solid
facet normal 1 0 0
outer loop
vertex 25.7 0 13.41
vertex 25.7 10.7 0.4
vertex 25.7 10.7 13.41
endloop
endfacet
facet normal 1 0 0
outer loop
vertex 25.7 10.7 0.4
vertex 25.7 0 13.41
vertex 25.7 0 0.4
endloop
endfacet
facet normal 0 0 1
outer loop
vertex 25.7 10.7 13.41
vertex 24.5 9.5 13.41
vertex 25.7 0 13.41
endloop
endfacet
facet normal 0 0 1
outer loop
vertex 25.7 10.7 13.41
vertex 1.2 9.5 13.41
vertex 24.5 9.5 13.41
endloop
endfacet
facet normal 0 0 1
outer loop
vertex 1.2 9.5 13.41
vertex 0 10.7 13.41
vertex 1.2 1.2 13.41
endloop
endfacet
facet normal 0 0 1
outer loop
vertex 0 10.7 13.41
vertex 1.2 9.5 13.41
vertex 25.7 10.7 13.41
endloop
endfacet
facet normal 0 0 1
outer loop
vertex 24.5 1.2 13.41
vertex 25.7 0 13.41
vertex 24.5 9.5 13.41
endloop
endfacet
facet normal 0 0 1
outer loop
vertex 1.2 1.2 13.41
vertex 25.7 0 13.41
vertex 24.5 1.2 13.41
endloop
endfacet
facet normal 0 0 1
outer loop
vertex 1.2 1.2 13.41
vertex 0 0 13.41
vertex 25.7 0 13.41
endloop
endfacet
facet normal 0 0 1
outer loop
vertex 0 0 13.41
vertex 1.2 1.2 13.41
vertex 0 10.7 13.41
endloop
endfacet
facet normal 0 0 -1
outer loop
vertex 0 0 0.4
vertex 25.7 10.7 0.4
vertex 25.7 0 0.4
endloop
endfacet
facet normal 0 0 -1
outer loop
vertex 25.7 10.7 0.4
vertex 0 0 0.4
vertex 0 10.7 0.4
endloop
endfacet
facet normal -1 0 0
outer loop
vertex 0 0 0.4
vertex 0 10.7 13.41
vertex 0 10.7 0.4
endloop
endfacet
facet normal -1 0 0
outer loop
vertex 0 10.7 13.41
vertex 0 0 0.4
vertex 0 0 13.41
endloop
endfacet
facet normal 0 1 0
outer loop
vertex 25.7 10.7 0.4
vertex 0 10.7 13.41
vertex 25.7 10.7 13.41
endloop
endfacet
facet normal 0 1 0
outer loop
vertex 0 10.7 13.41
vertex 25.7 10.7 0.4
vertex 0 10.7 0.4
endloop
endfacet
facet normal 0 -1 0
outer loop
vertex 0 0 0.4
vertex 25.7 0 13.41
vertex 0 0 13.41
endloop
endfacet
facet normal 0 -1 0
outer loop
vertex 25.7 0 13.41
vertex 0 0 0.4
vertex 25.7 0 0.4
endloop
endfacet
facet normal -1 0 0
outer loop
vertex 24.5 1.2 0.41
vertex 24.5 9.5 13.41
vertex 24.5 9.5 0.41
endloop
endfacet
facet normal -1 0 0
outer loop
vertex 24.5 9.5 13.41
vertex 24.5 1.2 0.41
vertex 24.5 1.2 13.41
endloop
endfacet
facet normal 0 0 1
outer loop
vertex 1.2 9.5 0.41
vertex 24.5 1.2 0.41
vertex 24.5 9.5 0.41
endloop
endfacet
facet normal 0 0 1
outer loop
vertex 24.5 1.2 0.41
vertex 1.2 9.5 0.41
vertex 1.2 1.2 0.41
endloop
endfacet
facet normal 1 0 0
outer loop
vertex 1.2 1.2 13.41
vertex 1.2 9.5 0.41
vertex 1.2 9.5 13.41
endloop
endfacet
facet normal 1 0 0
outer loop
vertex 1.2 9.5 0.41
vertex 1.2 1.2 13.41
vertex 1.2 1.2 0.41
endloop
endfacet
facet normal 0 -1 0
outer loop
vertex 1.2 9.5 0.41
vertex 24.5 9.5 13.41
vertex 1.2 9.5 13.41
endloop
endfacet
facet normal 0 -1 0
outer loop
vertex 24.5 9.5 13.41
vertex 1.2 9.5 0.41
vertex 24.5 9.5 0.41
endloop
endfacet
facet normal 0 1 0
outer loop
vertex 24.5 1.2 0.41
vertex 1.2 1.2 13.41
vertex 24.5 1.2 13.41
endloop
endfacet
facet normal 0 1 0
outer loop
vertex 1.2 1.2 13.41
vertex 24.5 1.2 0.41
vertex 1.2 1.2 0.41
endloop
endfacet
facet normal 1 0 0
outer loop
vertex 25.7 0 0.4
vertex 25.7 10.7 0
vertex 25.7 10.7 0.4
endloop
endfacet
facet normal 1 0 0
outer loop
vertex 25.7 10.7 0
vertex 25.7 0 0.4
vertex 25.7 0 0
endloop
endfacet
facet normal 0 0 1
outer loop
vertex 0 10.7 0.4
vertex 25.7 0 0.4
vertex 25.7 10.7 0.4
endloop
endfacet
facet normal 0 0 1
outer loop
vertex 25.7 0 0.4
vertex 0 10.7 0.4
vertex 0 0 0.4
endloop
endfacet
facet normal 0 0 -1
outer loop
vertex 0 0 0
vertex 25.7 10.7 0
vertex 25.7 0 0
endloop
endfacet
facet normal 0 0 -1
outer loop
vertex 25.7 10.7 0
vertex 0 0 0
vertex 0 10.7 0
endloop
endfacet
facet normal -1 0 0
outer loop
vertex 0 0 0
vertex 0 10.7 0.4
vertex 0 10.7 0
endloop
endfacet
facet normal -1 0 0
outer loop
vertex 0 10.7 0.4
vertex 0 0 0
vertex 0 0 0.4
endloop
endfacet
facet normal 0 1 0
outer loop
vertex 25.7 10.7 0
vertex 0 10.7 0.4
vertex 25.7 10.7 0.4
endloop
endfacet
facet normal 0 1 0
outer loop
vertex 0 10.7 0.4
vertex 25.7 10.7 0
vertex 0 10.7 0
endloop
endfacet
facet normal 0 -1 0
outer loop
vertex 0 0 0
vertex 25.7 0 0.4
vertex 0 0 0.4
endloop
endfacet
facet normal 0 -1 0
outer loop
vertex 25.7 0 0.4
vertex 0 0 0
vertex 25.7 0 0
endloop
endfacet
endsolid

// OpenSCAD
// file: ../../Base/Boxes.scad
// Fischertechnik Box Foundation
// Pre-designed Boxes

use <Constants.scad>

include <PlacementOptions.scad>

box190Width = 190;
box190Depth = 130;
box130Width = 130;
box130Depth = 95;
boxUsageHeight = 33.9;
boxWallThickness = 2.4;
boxBaseThickness = 1.0;
boxWebWidth = 3.0;

// getBoxWallThickness()
// Gets the wall thickness of a Fischertechnik Box

function getBoxWallThickness() = boxWallThickness;

// Gets the usable height of a fischertechnik box
function getBoxUsageHeight() = boxUsageHeight;

// Gets the thickness of the Fischertechnik box base.
function getBoxBaseThickness() = boxBaseThickness;

// Gets the width of a box web
function getBoxWebWidth() = boxWebWidth;

// Gets the usable inner space of a Box 190 as an x/y-list
function getBox190Space() = [
    box190Width - 2*getBoxWallThickness(), 
    box190Depth - 2*getBoxWallThickness() ];

// Imports the Fischertechnik empty box 130x190 mm and places it at position 0,0
// 190x130 are the outer sizes, the inner space is slightly smaller. Use getBox190Space() to get the inner sizes.
// This module needs the STL file "Fischertechnik Box 130x190.stl" in the library path.
// The box is positioned that the usable inner space is at the 0,0,0 position. The

module Box190() {
    translate([-getBoxWallThickness(),-getBoxWallThickness(),-getBoxBaseThickness()])
        import("Fischertechnik Box 130x190.stl", convexity=3);
}

// Gets the usable inner space of a Box 130 as an x/y-list
function getBox130Space() = [
    box130Width - 2*getBoxWallThickness(), 
    box130Depth - 2*getBoxWallThickness() ];

// Imports the Fischertechnik empty box 95x130 mm and places it at position 0,0
// 190x130 are the outer sizes, the inner space is slightly smaller. Use getBox190Space() to get the inner sizes.
// This module needs the STL file "Fischertechnik Box 95x130.stl" in the library path.
// The box is positioned that the usable inner space is at the 0,0,0 position. The

module Box130() {
    translate([-getBoxWallThickness(),-getBoxWallThickness(),-getBoxBaseThickness()])
        import("Fischertechnik Box 95x130.stl", convexity=3);
}

// Creates a web at the specified box walls
// corner 0 = LowerLeft, 1 = UpperLeft, 2 = UpperRight, 3 = LowerRight
// side 0 = LeftOfCorner, 1 = RightOfCorner
// distance = Distance in mm from the corner
// box = inner width and depth of the box (default: Box 190)
// webWidth = length of the web (default is 3 mms)
// webThickness = thickness of the web (default is 1 mm)

module BoxWeb(corner, side, distance, box=getBox190Space(), webWidth=getBoxWebWidth(), webThickness=1.0) {
    sink = getBoxWallThickness()/2;

    width = (corner % 2 == 0) ? 
            (side == LeftOfCorner ? webWidth : webThickness) :
            (side == LeftOfCorner ? webThickness : webWidth);

    depth = (corner % 2 == 0) ? 
            (side == RightOfCorner ? webWidth : webThickness) :
            (side == RightOfCorner ? webThickness : webWidth);
    
    xDiff = corner == LowerLeft ? 
                (side == LeftOfCorner ? -sink : distance) :
            (corner == UpperLeft ?                
                (side == LeftOfCorner ? distance : -sink) :
            (corner == UpperRight ?
                (side == LeftOfCorner ? box.x-webWidth+sink : box.x-distance-webThickness) :
                (side == LeftOfCorner ? box.x-distance-webThickness: box.x-webWidth+sink)));

    yDiff = corner == LowerLeft ? 
                (side == RightOfCorner ? -sink : distance) :
            (corner == UpperLeft ?
                (side == RightOfCorner ? box.y-distance : box.y-webWidth+sink) :
            (corner == UpperRight ?
                (side == RightOfCorner ? box.y-webWidth+sink : box.y-distance) :
                (side == RightOfCorner ? distance : -sink)));
    
    translate([xDiff, yDiff, -getExcess()])
        cube([width, depth, boxUsageHeight + 2*getExcess()]);
}
// file: ../../Base/Rotation.scad
// Fischertechnik Box Foundation
// Geometry Helpers Rotation

include <PlacementOptions.scad>

// getRotatedSpace(space, rotation=NoRotation)
// Rotates the space dependent on the specified rotation

function getRotatedSpace(space, rotation=NoRotation) = [
    (rotation == Rotate90 || rotation == Rotate270) ? space.y : space.x,
    (rotation == Rotate90 || rotation == Rotate270) ? space.x : space.y
];

// Rotates the given space around the fixed left lower corner
// space = the space the children needs as width/depth list [width,depth]
// rotation = 0 Rotate0 degrees, 1 Rotate90 degrees, 2 Rotate180 degrees, 3 Rotate270 degrees (equivalent to -90)

module RotateFix(space, rotation=Rotate0) {
    dy = (rotation == Rotate0 || rotation == Rotate270) ? 0 :
        (rotation == Rotate90) ? space.x :
        space.y;
    dx = (rotation < Rotate180) ? 0 :
        (rotation == Rotate180) ? space.x :
        space.y;
    
    translate([dx, dy, 0])
        rotate([0, 0, rotations[rotation]])
            children();
}
// file: ../../Base/Alignment.scad
// Fischertechnik Box Foundation
// Geometry Helpers Alignment

include <PlacementOptions.scad>

// getAlignedX(elementWidth, spaceWidth, align=AlignRight, offset=0)
// Gets the aligned X offset of an element with the given
// width in the given space.
// elementWidth = The width of the element to positon
// spaceWidth = The space where the element should be aligned
// align = 0 AlignLeft, 1 AlignCenter, 2 AlignRight
// offset = an optional offset from the aligned position. When
// aligned left or centered, then positive values are in X direction.
// When aligned right then positive values are in negative X direction.

function getAlignedX(elementWidth, spaceWidth, align=AlignRight, offset=0) =
    (align == AlignLeft) ?
        offset :
        ((align == AlignCenter) ?
        (spaceWidth - elementWidth)/2 + offset :
        spaceWidth - offset - elementWidth);

// getAlignedY(elementDepth, spaceDepth, align=AlignTop, offset=0)
// Gets the aligned Y offset of an element with the given
// depth in the given space.
// elementDepth = The depth of the element to positon
// spaceDepth = The space where the element should be aligned
// align = 0 AlignBottom, 1 AlignCenter, 2 AlignTop
// offset = an optional offset from the aligned position. When
// aligned bottom or centered, then positive values are in Y direction.
// When aligned top then positive values are in negative Y direction.

function getAlignedY(elementDepth, spaceDepth, align=AlignTop, offset=0) =
    (align == AlignBottom) ?
        offset :
        ((align == AlignCenter) ?
        (spaceDepth - elementDepth)/2 + offset :
        spaceDepth - offset - elementDepth);
// file: ../../Base/PlacementOptions.scad
// Fischertechnik Box Foundation
// Placement Options

// Alignment
NoAlign = 0;
AlignLeft = 1;
AlignBottom = 2;
AlignCenter = 3;
AlignRight = 4;
AlignTop = 5;

// Element rotation degree steps
rotations = [0, -90, -180, -270];

// Rotation
NoRotation = 0;
Rotate0 = 0;
Rotate90 = 1;
Rotate180 = 2;
Rotate270 = 3;

// Docking (seen from above)
NoDock = -1;
DockLeft = 0;
DockTop = 1;
DockRight = 2;
DockCorner = 2;
DockBottom = 3;

// Web corners
LowerLeft = 0;
UpperLeft = 1;
UpperRight = 2;
LowerRight = 3;

// Web position relative to corner
LeftOfCorner = 0;
RightOfCorner = 1;
// file: ../../Base/Placement.scad
// Fischertechnik Box Foundation
// Geometry Helpers Placement

use <Constants.scad>
use <Alignment.scad>
use <Rotation.scad>
use <Boxes.scad>

include <PlacementOptions.scad>

// Place(x=0, y=0, elementSpace=[0,0], alignX=AlignLeft, alignY=AlignBottom, rotation=Rotate0, boxSpace=getBox190Space())
// Places the child at the specified position
// y = Y-Position. This is a relative position when an X aligment is specified.
// x = X-Position. This is a relative position when an Y aligment is specified.
// elementSpace = space of the element to be placed [x,y]
// alignX = -1=NoAlign, 0 AlignLeft, 1 AlignCenter, 3 AlignRight (elementSpace and boxSpace required!)
// alignY = -1=NoAlign, 2 AlignBottom, 1 AlignCenter, 4 AlignTop (elementSpace and boxSpace required!)
// rotation = 0 Rotate0 0 degrees, 1 Rotate90 90 degrees, 
// 2 Rotate180 180 degrees, 3 Rotate270 270 degrees (equivalent to -90)
// boxSpace = Inner space of the box where the placement occurs [x,y] - default is Box 190x130 inner space

module Place(x=0, y=0, elementSpace=[0,0], 
  alignX=AlignLeft, alignY=AlignBottom, 
  rotation=NoRotation, boxSpace=getBox190Space()) {

    module Position(x, y, space, rotation=Rotate0) {
        translate([x, y, 0])
            RotateFix(space, rotation)
                children();
    }

    space = getRotatedSpace(elementSpace, rotation);
    alignedX = getAlignedX(space.x, boxSpace.x, alignX, x);
    alignedY = getAlignedY(space.y, boxSpace.y, alignY, y);
    Position(alignedX, alignedY, elementSpace, rotation)
        children();
}

// Center(space=getBox130Space(), elementSpace=[0,0])
// space = Space where the children is centered. For cylinder use centered=true and no elementSpace.
// elementSpace = space of the element to be centered [x,y]

module Center(space=getBox190Space(), elementSpace=[0,0]) {
    translate([(space.x - elementSpace.x) / 2, (space.y - elementSpace.y) / 2])
        children(0);
}

// CenterHorizontal(width=0, y=0, offset=0, space=getBox130Space())
// space = Space where the children is centered. For cylinder use centered=true and no elementSpace.
// elementSpace = space of the element to be centered [x,y]

module CenterHorizontal(width=0, y=0, offset=0, space=getBox190Space()) {
    translate([(space.x - width) / 2 + offset, y])
        children(0);
}

// CenterVertical(depth=0, x=0, offset=0, space=getBox130Space())
// space = Space where the children is centered. For cylinder use centered=true and no elementSpace.
// elementSpace = space of the element to be centered [x,y]

module CenterVertical(depth=0, x=0, offset=0, space=getBox190Space()) {
    translate([x, (space.y - depth) / 2 + offset])
        children(0);
}
// file: ../../Elements/AxisClip10.scad
// Fischertechnik Box Library
// Axis for clip 10
// 31023

use <../ModelBase/Simple.scad>

width = 12;
depth = 12;
height = 23;

// getAxisClip10Space()
// Gets the space of a frame for a clip 10 with spring ring (mot2)

function getAxisClip10Space() = [width, depth, height];

// AxisClip10()
// Axis for clip 10 with spring ring (mot2)

module AxisClip10() {
    LeveledAxisWithSpace(height, height-10, getAxisClip10Space());
}

// Tests
color("lightgray")
AxisClip10();
// file: ../../Base/Constants.scad
// Fischertechnik Box Foundation
// Constants

// Constant values necessary for multiple elements

// Base constants
dividerThickness = 1.2;
excess = 0.01;
fragments = 90;
tolerance = 0.8;

// Gets the thickness of a divider 
function getDividerThickness() = dividerThickness;

// Gets the excess that is used to merge walls into each other
function getExcess() = excess;

// Gets amount of fragments of a cylinder
function getFragments() = fragments;

// Gets the inner tolerance of a frame to each side
function getTolerance() = tolerance;


// Fischertechnik specific constants
axisDiameter = 4;
axisBottomDiameter = axisDiameter + 1;
standardEdgeDistance = 2.5;
standardWebDistance = 11.5;
standardCornerLength = 15;
tubeWallFactor = 0.8;

// Gets axis diameter
function getAxisDiameter() = axisDiameter;

// Gets axis bottom diameter for thicker part at the bottom
function getAxisBottomDiameter() = axisBottomDiameter;

// gets the standard distance to the wall of the box for dockable frames with webs
function getStandardEdgeDistance() = standardEdgeDistance;

// gets the standard distance of each web to the corner of the dockable frame
function getStandardWebDistance() = standardWebDistance;

// gets the standard length of the corner walls of a dockable frame
function getStandardCornerLength() = standardCornerLength;

// gets the wall thickness of a tube.
function getTubeWallThickness() = tubeWallFactor * getDividerThickness();
// file: ../../Elements/FramePulley.scad
// Fischertechnik Box Library
// Frame for Pulley
// 35795

use <../ModelBase/Simple.scad>

width = 22.5;
depth = 7.5;
height = 13;

// getFramePulleySpace(columns=1, rows=1)
// Gets the space the frame pulley needs as width and depth (.x and .y as a list)
// columns = Count of pulleys in X direction, small side
// rows = Count of pulleys in Y direction

function getFramePulleySpace(columns=1, rows=1) = getFrameOuterVolume([width*columns, depth*rows, height]);

// FramePulley(columns=1, rows=1)
// columns = Count of pulleys in X direction
// rows = Count of pulleys in Y direction
// The walls of the frame are 13 mm high. The small side of the pulley
// is 7.5 mm wide, the large side is 22.5 mm wide.
// The complete frame has a tolerance of addition 1 mm in each direction.

module FramePulley(columns=1, rows=1) {
    Frame([width*columns, depth*rows, height]);
}

// Tests
color("lightgray") {
    FramePulley();
}
// file: ../TestPrint.scad
// 3D Print Test Base

use <../Base/Constants.scad>

use <../Elements/AxisClip10.scad>

module TestPrint(elementSpace) {
    cube([elementSpace.x, elementSpace.y, 0.4]);
    translate([0,0,0.4+getExcess()]) {
        children();
    }
}

TestPrint(getAxisClip10Space())
    AxisClip10();
// main file
// 3D Print Test Base
// FramePulley

use <../TestPrint.scad>
use <../../Elements/FramePulley.scad>

TestPrint(getFramePulleySpace())
    FramePulley();
